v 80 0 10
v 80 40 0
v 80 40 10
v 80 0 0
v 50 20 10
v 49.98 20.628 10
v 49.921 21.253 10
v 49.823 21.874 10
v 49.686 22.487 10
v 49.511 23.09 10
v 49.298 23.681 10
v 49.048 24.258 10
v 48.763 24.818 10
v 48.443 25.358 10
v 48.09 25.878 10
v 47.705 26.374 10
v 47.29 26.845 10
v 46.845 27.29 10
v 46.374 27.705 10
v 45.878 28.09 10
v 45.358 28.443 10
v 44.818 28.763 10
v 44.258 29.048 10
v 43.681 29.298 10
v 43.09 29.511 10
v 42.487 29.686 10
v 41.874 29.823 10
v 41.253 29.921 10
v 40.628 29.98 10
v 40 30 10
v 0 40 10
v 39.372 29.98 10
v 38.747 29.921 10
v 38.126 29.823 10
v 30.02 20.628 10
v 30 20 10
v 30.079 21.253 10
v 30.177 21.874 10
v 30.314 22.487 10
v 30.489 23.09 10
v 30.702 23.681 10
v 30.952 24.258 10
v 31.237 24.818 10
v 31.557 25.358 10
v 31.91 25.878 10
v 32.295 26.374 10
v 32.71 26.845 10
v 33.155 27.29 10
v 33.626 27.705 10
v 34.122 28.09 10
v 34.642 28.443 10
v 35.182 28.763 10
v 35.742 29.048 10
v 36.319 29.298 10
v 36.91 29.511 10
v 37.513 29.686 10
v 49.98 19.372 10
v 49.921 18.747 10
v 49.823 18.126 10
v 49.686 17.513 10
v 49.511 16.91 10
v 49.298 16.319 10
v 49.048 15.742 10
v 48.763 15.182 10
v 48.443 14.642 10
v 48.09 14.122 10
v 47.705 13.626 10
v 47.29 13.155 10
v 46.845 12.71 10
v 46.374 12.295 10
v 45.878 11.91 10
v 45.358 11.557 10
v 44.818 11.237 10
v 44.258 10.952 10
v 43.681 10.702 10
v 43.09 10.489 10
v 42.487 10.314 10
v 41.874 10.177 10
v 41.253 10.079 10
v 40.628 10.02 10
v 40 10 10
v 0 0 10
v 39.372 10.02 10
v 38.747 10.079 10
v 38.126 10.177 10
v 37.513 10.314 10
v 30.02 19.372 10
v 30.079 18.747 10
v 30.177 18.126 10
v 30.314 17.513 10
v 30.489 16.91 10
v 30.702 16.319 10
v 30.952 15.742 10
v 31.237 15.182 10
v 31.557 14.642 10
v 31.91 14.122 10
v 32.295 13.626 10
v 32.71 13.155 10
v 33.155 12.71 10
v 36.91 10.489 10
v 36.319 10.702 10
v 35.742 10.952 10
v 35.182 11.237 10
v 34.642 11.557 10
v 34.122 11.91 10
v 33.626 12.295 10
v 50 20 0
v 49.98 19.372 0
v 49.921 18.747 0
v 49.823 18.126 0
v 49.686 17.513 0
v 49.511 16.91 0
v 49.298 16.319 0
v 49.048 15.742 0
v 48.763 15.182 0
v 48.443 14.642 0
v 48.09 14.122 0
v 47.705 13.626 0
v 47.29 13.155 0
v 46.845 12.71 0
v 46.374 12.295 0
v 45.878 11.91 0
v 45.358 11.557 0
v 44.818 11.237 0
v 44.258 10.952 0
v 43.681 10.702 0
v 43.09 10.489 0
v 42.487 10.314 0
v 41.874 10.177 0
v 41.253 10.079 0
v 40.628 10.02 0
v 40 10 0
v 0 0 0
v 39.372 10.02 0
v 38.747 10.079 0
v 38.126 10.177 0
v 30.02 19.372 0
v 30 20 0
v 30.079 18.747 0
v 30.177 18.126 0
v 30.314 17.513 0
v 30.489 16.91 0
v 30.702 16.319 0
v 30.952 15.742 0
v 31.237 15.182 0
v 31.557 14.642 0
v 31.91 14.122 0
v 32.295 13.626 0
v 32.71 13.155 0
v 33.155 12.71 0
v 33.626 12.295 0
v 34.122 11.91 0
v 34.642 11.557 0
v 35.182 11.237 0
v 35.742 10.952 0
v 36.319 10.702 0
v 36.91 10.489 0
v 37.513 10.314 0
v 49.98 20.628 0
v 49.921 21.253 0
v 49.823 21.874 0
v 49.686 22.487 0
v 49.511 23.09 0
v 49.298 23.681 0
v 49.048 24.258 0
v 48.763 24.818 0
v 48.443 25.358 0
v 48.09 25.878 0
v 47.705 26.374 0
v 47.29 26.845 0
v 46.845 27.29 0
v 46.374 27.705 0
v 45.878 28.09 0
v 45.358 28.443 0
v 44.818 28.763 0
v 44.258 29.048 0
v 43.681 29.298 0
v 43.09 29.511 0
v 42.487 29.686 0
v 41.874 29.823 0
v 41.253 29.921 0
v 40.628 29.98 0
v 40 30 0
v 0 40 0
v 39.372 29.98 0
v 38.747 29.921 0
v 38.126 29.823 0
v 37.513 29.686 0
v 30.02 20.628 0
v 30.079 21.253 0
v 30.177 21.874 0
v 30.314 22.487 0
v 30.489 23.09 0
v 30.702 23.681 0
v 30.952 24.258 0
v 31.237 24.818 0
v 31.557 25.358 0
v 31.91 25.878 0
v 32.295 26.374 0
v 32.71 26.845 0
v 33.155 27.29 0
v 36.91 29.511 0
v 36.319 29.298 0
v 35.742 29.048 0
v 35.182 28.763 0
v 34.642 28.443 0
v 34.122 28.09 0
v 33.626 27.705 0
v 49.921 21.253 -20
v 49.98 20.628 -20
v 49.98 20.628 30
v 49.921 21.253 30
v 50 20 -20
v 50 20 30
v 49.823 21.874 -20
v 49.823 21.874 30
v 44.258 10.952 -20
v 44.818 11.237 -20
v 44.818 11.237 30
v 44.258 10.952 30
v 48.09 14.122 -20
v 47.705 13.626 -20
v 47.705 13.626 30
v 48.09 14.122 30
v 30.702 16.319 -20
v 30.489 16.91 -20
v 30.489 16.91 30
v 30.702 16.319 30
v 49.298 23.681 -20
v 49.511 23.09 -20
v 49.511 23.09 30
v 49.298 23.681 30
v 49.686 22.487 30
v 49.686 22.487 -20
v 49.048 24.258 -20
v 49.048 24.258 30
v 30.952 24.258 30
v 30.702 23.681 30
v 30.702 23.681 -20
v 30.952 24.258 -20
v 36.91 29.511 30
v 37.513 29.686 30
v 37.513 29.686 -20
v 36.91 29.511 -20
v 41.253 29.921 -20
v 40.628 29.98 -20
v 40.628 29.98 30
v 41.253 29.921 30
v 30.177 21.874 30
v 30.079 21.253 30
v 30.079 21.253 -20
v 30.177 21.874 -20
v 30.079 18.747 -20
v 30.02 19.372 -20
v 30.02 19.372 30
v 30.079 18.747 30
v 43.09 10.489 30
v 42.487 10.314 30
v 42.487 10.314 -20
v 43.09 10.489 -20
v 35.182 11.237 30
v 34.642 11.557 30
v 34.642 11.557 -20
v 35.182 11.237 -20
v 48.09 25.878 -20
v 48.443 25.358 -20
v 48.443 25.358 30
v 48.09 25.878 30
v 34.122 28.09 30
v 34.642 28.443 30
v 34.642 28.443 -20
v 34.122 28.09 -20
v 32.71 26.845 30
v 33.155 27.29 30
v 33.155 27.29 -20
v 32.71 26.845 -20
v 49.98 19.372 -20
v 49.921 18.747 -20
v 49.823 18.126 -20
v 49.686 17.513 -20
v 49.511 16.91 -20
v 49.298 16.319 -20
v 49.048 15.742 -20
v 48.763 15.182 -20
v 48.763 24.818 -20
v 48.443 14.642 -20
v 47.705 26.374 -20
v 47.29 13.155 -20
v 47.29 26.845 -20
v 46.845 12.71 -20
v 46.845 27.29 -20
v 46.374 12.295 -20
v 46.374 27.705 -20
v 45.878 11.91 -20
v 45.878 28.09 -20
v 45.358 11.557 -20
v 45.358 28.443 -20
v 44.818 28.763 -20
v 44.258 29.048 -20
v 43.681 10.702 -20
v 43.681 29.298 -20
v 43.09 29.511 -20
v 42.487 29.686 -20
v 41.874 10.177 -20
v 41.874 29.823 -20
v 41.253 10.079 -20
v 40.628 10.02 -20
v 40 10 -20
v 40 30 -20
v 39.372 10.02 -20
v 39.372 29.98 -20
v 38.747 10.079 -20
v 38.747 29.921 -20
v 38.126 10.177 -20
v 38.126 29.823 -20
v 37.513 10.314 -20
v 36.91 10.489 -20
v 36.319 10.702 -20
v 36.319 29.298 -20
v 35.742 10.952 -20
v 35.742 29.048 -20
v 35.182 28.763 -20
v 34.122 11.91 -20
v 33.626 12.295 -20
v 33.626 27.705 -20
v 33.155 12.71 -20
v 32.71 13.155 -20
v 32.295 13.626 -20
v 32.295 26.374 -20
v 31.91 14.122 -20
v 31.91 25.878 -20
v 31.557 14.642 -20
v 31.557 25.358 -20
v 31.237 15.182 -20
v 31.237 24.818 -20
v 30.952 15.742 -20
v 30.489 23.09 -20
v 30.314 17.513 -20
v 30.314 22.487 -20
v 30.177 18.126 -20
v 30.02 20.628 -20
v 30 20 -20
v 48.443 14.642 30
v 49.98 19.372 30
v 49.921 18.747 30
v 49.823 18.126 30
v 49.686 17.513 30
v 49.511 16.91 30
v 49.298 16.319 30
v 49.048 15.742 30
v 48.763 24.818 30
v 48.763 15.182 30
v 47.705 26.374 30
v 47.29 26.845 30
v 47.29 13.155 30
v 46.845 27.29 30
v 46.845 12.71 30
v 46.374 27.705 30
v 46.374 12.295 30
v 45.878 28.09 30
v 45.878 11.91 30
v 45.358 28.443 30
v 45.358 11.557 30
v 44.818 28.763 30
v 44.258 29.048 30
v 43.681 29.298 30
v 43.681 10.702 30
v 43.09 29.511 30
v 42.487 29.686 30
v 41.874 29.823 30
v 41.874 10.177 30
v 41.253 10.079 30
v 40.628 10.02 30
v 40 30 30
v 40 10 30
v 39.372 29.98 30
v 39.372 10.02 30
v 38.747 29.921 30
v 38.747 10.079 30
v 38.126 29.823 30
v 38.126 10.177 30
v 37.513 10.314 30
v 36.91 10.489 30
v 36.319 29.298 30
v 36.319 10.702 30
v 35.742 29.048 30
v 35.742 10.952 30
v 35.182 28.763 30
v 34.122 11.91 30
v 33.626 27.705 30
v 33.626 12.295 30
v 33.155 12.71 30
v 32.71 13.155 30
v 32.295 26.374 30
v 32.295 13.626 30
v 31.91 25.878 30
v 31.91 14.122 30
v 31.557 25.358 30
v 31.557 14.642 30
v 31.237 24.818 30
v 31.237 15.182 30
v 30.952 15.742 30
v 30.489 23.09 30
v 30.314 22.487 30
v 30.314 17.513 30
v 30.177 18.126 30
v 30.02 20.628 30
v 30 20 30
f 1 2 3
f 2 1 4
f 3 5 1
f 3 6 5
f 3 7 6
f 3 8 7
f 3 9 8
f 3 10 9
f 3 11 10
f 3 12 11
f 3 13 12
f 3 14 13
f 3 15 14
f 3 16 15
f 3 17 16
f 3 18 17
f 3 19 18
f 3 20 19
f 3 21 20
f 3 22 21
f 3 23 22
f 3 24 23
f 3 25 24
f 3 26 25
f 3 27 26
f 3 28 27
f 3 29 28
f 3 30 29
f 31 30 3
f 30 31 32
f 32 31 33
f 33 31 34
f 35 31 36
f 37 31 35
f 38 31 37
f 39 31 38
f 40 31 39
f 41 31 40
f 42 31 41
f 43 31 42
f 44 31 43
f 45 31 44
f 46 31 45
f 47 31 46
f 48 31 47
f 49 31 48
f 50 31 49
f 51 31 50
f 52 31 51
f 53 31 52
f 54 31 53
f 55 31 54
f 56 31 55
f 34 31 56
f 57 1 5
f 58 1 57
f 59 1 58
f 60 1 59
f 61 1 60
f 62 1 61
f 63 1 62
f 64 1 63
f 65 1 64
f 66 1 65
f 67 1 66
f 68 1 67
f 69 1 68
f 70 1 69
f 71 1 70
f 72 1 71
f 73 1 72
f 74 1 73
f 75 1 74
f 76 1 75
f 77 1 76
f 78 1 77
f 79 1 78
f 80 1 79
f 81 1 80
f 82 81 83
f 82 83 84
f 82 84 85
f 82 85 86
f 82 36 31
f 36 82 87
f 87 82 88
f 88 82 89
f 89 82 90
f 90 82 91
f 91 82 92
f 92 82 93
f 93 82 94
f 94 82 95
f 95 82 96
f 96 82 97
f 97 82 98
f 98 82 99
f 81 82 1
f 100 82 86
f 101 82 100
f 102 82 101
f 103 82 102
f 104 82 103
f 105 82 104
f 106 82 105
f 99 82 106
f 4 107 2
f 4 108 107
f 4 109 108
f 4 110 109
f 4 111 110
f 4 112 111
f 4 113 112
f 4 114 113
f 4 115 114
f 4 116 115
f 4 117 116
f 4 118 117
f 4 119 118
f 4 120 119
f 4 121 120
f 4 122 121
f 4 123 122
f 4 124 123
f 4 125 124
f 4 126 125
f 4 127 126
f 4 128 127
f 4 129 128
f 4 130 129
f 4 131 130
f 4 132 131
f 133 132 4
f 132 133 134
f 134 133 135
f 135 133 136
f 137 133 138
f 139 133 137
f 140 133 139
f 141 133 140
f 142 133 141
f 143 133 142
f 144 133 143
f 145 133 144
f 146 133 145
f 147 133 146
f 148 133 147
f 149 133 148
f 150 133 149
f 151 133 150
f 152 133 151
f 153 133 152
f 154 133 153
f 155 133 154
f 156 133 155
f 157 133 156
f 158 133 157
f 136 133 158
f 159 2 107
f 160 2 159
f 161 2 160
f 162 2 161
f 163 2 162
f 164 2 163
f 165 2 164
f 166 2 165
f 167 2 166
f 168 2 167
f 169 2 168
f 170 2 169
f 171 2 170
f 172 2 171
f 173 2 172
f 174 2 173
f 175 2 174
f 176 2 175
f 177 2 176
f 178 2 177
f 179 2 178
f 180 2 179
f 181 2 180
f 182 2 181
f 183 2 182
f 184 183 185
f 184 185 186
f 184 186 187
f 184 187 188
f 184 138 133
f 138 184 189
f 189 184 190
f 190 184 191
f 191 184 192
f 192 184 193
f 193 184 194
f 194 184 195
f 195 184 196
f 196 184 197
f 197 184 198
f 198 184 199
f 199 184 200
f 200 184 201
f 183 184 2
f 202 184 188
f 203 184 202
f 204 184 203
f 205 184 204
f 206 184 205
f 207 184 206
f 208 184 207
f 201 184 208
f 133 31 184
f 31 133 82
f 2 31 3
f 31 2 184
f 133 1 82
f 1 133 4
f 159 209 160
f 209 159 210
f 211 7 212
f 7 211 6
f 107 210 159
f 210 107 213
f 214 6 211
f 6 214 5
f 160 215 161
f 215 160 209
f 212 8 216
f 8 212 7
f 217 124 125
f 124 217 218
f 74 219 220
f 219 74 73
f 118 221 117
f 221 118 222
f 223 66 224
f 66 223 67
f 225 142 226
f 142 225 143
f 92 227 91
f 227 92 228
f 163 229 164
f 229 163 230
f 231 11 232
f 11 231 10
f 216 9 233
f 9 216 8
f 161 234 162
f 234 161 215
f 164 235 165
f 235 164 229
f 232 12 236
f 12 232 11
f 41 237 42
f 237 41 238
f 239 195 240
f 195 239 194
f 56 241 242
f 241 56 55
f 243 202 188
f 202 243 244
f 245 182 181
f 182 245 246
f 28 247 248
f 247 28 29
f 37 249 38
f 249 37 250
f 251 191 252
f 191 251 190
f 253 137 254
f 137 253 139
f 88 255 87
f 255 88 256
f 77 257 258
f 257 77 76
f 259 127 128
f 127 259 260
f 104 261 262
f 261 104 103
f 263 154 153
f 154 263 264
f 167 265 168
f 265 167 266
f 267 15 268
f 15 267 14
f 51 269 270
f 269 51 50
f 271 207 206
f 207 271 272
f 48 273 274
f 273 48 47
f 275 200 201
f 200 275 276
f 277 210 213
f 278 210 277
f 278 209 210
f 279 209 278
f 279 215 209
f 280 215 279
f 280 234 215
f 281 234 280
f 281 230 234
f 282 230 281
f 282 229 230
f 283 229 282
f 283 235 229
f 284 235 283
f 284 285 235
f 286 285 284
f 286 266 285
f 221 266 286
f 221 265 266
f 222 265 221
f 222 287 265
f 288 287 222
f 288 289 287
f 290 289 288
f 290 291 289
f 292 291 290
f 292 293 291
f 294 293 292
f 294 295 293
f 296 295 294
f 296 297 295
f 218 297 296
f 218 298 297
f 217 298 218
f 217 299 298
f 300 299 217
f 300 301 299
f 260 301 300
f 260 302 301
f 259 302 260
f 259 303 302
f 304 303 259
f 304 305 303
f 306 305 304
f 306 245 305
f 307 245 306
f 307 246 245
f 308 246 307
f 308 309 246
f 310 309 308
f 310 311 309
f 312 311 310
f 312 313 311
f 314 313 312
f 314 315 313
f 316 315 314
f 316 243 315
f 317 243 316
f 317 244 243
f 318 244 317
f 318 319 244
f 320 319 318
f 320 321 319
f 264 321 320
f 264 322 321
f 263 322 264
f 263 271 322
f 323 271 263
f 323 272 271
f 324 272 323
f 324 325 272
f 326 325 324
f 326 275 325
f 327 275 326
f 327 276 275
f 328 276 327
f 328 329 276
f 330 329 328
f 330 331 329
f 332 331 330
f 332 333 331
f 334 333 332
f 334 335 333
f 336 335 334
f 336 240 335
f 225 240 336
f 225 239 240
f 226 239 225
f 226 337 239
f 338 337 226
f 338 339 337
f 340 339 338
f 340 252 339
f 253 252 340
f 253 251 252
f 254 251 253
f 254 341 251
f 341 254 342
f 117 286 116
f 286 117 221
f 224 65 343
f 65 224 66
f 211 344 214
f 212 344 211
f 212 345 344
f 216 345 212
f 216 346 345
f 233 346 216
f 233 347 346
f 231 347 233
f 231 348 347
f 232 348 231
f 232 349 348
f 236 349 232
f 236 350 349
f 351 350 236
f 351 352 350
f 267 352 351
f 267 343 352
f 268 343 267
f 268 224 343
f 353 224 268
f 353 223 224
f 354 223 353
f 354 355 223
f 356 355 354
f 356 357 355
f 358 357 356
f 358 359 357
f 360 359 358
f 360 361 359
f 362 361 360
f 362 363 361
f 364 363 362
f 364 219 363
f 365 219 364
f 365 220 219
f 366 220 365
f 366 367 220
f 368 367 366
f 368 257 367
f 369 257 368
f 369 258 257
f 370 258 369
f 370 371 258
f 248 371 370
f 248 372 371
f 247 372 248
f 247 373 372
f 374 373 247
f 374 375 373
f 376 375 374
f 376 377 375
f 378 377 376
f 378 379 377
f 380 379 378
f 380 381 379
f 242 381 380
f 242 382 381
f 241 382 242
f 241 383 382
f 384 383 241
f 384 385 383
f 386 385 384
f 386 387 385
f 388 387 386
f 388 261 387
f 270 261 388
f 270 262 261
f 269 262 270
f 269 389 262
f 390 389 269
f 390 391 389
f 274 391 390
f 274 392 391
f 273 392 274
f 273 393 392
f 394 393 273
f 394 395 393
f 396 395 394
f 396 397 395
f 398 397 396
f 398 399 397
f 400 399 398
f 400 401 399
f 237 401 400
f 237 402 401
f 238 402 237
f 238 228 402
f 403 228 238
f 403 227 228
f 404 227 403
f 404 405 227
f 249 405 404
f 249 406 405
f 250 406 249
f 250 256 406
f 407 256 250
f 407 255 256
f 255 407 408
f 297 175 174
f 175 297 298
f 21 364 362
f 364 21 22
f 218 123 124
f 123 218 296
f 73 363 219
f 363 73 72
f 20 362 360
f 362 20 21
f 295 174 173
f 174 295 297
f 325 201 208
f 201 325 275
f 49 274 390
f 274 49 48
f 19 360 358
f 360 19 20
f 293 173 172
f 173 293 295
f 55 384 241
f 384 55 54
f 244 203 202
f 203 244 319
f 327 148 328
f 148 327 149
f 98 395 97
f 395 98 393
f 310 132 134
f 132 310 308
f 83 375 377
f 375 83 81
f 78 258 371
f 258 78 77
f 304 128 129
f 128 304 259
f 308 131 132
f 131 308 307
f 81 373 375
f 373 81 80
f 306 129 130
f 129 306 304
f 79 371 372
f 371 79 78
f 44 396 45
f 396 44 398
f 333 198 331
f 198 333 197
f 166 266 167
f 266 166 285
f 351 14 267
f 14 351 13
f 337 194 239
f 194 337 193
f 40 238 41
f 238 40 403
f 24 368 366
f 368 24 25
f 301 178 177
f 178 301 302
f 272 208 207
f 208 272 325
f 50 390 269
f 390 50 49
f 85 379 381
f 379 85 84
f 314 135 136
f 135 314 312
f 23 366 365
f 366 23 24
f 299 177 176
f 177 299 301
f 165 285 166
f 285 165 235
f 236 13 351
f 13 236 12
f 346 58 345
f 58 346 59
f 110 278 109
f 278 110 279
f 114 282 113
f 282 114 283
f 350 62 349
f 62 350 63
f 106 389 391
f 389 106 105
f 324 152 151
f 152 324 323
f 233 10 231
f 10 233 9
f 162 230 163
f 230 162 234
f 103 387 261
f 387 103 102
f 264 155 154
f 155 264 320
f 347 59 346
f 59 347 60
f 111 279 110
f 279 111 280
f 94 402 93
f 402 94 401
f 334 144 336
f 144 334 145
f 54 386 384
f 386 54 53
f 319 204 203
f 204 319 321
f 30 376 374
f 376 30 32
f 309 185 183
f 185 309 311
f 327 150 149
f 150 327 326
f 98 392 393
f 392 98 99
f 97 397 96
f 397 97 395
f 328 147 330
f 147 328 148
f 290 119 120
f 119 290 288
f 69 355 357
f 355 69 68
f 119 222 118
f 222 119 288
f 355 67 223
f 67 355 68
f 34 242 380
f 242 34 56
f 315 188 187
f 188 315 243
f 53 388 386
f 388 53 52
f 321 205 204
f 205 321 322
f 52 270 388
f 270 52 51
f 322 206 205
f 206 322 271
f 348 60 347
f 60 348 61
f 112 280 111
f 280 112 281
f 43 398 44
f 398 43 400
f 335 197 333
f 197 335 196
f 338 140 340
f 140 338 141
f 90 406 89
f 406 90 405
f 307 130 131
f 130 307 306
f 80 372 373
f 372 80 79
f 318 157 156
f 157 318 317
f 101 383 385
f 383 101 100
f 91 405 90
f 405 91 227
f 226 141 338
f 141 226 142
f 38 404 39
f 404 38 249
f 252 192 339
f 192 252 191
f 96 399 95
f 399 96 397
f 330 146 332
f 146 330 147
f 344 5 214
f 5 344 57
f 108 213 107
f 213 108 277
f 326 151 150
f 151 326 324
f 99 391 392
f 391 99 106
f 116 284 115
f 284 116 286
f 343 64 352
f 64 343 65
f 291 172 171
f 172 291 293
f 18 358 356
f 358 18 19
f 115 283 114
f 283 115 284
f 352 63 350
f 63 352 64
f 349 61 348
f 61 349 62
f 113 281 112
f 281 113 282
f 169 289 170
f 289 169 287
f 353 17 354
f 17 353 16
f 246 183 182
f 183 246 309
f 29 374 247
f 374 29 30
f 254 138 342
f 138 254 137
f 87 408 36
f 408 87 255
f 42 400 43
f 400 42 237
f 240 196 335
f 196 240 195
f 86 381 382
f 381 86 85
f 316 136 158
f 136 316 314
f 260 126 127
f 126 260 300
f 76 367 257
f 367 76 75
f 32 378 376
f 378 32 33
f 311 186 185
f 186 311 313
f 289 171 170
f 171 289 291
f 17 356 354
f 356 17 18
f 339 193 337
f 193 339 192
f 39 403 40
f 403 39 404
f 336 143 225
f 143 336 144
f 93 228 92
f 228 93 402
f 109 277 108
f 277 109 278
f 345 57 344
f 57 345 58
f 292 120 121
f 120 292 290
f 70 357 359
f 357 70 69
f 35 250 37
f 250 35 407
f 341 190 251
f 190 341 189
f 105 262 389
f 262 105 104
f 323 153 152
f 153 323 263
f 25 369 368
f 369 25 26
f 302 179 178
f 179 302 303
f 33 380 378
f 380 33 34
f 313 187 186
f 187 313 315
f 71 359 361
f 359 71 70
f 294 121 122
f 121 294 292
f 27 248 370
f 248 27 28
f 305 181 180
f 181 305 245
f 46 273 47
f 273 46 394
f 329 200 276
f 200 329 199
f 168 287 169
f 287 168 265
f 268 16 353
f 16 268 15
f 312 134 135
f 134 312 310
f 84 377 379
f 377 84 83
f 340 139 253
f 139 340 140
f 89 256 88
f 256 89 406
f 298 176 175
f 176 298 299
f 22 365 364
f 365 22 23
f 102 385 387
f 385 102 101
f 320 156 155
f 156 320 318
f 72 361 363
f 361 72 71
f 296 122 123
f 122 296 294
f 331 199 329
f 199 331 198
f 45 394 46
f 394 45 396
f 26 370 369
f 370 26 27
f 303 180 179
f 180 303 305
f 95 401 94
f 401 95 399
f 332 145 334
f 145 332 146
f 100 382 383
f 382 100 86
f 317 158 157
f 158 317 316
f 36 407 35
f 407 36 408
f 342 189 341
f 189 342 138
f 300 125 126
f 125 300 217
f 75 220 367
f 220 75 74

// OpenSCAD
$fn = 100;

union() {
    cube ([80, 40, 10]);
    translate([40, 20, -20])
    cylinder(r=10, h=50);    
}
